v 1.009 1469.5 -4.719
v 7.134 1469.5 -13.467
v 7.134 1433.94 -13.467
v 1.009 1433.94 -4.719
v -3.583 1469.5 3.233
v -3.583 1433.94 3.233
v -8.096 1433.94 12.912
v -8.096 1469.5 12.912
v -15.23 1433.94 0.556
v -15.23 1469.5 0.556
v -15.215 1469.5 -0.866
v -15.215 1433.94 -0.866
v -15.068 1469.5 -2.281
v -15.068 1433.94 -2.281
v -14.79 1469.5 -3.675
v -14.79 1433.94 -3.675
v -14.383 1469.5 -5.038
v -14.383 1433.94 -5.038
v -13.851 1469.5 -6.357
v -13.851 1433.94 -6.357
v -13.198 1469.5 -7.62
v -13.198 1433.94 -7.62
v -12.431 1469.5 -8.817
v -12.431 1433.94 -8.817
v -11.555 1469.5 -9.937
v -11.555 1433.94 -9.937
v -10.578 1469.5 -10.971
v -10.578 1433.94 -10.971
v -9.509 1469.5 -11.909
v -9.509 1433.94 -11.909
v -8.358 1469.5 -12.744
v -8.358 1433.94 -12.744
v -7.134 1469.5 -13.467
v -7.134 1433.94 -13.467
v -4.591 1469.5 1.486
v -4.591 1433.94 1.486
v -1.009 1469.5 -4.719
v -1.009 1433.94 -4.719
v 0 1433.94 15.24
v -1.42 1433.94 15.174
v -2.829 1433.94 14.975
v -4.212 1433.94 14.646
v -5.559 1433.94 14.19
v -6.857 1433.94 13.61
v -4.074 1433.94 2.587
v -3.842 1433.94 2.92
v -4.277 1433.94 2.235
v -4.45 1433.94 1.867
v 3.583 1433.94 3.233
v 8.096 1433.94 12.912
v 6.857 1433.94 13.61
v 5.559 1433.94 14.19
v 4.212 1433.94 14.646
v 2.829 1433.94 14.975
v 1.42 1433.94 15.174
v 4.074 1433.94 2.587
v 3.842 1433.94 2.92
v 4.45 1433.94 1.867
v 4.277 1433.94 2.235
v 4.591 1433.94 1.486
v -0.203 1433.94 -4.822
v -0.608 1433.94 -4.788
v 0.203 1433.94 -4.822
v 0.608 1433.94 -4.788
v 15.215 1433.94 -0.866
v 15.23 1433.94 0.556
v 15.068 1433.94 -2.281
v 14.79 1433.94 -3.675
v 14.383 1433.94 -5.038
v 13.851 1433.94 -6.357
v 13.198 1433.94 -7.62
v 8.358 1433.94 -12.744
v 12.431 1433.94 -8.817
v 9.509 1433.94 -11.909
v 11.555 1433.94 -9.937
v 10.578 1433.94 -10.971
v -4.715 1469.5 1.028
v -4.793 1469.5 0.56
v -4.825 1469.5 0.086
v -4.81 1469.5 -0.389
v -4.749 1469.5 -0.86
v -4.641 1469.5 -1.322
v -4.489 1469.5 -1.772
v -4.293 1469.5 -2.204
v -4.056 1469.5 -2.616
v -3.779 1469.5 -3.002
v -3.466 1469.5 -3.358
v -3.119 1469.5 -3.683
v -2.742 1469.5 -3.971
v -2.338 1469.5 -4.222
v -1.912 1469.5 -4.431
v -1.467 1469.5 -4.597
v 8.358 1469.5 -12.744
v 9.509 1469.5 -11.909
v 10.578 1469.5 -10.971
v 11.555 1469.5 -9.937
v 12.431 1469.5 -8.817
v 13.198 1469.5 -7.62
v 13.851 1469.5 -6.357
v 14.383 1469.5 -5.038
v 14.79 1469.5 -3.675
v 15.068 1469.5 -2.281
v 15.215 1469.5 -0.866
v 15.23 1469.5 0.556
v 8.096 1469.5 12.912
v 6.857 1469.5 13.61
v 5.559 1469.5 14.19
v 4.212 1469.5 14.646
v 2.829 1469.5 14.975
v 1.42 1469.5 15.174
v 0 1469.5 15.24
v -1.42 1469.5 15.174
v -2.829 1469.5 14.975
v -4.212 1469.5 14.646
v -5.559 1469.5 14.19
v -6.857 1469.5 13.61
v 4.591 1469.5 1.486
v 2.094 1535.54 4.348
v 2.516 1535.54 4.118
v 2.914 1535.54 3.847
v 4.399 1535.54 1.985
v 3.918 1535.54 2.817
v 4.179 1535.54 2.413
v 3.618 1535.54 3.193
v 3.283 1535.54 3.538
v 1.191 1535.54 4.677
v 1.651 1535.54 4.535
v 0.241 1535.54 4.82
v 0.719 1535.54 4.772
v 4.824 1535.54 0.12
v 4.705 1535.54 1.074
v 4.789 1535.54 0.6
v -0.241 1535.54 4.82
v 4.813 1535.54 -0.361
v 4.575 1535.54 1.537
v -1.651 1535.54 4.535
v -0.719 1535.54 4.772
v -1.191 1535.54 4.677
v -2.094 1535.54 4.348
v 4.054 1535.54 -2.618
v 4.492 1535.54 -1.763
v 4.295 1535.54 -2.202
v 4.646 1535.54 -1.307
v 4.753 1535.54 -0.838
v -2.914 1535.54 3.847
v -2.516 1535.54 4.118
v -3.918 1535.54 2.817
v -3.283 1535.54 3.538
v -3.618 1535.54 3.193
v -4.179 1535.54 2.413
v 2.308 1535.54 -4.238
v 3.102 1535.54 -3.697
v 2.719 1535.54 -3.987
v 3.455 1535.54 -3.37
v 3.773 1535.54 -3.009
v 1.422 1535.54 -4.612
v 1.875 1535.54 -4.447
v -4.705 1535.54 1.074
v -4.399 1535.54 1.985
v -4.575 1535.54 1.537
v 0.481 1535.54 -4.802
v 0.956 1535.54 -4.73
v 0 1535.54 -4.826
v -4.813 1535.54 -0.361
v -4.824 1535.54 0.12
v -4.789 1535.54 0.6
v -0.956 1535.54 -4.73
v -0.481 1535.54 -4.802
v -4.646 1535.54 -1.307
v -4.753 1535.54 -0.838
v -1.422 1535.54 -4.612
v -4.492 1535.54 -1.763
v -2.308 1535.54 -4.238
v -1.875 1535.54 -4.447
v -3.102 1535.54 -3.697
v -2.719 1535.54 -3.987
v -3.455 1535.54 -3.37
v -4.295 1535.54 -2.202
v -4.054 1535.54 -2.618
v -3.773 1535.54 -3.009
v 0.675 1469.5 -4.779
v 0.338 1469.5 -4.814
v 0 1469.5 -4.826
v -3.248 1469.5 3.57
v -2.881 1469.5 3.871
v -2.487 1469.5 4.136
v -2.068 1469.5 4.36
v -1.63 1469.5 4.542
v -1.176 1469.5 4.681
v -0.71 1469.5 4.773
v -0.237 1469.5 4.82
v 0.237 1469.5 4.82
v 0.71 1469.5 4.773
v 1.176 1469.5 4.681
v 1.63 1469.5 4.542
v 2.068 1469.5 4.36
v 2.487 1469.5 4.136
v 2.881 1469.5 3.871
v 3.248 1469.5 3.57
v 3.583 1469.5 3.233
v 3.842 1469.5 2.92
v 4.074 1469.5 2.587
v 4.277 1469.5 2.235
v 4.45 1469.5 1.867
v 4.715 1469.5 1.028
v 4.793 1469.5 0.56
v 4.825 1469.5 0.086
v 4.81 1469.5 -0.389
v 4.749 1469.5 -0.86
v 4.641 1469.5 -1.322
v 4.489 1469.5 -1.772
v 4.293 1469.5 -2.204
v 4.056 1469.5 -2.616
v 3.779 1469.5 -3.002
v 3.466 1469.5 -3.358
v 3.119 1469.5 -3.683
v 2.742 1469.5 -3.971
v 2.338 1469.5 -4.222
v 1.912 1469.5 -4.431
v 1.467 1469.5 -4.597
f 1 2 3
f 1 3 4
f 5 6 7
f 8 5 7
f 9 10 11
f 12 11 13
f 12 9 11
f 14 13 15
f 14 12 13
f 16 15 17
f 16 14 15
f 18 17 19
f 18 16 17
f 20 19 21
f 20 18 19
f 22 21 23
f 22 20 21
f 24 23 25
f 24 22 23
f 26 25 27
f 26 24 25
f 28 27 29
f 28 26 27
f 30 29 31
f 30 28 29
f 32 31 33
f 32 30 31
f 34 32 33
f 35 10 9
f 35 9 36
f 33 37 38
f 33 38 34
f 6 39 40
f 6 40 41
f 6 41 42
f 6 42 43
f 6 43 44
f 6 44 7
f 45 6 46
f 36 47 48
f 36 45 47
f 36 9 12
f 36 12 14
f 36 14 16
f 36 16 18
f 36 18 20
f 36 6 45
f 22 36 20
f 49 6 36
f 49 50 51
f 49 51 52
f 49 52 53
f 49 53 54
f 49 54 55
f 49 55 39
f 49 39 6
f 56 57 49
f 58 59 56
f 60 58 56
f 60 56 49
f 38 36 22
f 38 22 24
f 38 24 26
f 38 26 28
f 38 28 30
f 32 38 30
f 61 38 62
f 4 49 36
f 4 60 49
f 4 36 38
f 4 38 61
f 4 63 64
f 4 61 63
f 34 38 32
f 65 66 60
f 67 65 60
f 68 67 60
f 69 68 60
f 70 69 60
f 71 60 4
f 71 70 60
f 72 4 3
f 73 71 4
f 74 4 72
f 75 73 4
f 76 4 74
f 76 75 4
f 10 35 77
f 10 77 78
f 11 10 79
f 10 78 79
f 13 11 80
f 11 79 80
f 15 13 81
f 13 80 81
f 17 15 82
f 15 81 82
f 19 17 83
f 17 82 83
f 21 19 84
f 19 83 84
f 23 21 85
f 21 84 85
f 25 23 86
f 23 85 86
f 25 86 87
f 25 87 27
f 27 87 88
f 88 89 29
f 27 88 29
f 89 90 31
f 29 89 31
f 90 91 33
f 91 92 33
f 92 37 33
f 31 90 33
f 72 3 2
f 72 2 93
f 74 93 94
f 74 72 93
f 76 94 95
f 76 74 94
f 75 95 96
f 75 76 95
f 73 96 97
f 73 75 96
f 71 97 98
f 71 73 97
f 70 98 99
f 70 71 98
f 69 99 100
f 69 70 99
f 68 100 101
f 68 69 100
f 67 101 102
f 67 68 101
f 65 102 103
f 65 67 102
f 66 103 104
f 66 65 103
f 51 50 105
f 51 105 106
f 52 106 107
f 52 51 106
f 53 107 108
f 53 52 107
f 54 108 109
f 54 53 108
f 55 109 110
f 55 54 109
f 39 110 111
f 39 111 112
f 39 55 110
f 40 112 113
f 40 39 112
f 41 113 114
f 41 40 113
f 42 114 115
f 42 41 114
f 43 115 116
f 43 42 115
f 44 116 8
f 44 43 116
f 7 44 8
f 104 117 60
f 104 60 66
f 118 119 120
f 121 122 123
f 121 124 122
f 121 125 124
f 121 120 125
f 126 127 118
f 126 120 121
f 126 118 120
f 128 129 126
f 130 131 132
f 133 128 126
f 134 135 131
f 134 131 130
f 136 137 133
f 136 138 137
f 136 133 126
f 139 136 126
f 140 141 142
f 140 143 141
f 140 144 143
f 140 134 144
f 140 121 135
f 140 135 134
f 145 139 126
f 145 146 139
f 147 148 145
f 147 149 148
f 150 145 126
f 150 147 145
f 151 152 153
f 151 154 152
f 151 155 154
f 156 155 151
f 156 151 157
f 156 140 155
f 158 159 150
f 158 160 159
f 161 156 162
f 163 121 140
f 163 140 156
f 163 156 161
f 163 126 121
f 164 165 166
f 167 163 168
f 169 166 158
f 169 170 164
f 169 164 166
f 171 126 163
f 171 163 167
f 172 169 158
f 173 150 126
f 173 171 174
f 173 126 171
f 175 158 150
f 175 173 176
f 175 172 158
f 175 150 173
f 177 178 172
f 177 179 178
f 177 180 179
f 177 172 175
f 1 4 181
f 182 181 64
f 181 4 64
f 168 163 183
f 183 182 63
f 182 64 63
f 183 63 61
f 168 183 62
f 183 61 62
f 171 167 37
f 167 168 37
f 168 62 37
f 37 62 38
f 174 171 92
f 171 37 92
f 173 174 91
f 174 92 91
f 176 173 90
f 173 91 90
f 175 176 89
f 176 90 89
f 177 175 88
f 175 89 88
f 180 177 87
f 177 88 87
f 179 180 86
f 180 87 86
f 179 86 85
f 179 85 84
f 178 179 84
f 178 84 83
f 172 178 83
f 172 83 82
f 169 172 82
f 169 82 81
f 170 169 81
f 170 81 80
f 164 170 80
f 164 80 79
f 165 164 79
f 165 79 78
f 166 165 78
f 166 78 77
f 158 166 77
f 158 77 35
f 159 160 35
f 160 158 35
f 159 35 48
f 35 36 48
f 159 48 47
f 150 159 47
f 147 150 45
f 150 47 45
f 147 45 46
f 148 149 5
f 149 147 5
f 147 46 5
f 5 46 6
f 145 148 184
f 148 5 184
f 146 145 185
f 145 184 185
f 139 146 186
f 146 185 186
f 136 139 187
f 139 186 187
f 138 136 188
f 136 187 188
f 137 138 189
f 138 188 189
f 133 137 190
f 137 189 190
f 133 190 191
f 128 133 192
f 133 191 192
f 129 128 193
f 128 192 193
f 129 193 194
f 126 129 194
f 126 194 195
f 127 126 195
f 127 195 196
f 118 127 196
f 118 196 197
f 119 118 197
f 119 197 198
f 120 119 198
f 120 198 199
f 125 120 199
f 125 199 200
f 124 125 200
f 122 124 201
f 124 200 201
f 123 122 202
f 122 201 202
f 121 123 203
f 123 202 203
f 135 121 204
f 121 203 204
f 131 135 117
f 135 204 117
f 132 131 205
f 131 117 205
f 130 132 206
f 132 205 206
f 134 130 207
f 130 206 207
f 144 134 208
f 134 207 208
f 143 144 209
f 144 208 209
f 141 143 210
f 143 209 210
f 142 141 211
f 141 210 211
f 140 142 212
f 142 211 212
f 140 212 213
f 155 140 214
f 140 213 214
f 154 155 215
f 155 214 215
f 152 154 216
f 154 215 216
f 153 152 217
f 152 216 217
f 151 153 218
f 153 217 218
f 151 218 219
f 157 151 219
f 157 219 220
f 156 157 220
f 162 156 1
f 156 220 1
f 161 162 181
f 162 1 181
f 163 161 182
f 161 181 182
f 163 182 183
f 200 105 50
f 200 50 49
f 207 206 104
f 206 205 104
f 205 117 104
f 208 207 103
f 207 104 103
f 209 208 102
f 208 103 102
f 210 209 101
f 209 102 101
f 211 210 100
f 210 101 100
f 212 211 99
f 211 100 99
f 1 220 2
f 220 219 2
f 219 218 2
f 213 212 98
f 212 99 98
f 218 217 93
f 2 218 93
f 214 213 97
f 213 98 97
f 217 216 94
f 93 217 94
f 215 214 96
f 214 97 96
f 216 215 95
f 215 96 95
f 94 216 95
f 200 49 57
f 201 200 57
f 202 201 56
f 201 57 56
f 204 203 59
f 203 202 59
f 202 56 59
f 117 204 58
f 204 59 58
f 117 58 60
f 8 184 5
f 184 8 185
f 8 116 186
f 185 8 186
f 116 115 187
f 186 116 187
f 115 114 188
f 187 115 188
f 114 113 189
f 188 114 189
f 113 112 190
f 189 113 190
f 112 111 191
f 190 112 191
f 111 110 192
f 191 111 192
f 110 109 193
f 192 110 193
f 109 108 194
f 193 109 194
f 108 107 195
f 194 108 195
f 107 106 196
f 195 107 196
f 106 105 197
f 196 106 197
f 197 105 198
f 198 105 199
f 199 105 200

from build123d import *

# Parameters (mm, degrees)
SKETCH1_R           = 241.3
BOSS_EXTRUDE1_DEPTH = 5080
SKETCH2_R           = 762
BOSS_EXTRUDE3_DEPTH = 1778
CUT_EXTRUDE2_START  = -1778
CUT_EXTRUDE2_DEPTH  = 5252.397760119
CIRPATTERN1_COUNT   = 3
SCALE1_SCALE        = 0.02


with BuildPart() as part:
    # Sketch1 → Boss-Extrude1 (new body)
    with BuildSketch(Plane(origin=(0, 0, 0), x_dir=(1, 0, 0), z_dir=(0, 1, 0))):
        with Locations(Location((0, 0, 0), (0, 0, 90))):
            Circle(SKETCH1_R)
    extrude(amount=BOSS_EXTRUDE1_DEPTH)

    # Sketch2 → Boss-Extrude3 (add)
    with BuildSketch(Plane.XZ):
        with Locations(Location((0, 0, 0), (0, 0, 270))):
            Circle(SKETCH2_R)
    extrude(amount=-BOSS_EXTRUDE3_DEPTH)

    # Sketch4 → Cut-Extrude2 (cut)
    with BuildSketch(Plane(origin=(0, 1778, 0), x_dir=(1, 0, 0), z_dir=(0, 1, 0)).offset(CUT_EXTRUDE2_START)):
        with BuildLine():
            Line((2450.032308946, 3662.965924128), (356.689294384, 673.362270455))
            Line((356.689294384, 673.362270455), (50.425576786, 235.97235263))
            ThreePointArc((50.425576786, 235.97235263), (0, 241.3), (-50.425576786, 235.97235263))
            Line((-50.425576786, 235.97235263), (-356.689294384, 673.362270455))
            Line((-356.689294384, 673.362270455), (-2450.032308946, 3662.965924128))
            Line((-2450.032308946, 3662.965924128), (-2450.032308946, 10962.230265875))
            Line((-2450.032308946, 10962.230265875), (2450.032308946, 10962.230265875))
            Line((2450.032308946, 10962.230265875), (2450.032308946, 3662.965924128))
        make_face()
    cut_extrude2 = extrude(amount=CUT_EXTRUDE2_DEPTH, mode=Mode.SUBTRACT)

    # CirPattern1: Cut-Extrude2 ×3 about axis
    cirpattern1_axis = Axis((0, 5080, 0), (0, -1, 0))
    for i in range(1, CIRPATTERN1_COUNT):
        add(cut_extrude2.rotate(cirpattern1_axis, i * 360 / CIRPATTERN1_COUNT), mode=Mode.SUBTRACT)


with BuildPart() as part_1:
    # Scale1: scaled about (0, 1463.203660293, 0)
    add(part.part.scale(SCALE1_SCALE).moved(Location((0, 1433.939587087, 0))))


solid = part_1.part
